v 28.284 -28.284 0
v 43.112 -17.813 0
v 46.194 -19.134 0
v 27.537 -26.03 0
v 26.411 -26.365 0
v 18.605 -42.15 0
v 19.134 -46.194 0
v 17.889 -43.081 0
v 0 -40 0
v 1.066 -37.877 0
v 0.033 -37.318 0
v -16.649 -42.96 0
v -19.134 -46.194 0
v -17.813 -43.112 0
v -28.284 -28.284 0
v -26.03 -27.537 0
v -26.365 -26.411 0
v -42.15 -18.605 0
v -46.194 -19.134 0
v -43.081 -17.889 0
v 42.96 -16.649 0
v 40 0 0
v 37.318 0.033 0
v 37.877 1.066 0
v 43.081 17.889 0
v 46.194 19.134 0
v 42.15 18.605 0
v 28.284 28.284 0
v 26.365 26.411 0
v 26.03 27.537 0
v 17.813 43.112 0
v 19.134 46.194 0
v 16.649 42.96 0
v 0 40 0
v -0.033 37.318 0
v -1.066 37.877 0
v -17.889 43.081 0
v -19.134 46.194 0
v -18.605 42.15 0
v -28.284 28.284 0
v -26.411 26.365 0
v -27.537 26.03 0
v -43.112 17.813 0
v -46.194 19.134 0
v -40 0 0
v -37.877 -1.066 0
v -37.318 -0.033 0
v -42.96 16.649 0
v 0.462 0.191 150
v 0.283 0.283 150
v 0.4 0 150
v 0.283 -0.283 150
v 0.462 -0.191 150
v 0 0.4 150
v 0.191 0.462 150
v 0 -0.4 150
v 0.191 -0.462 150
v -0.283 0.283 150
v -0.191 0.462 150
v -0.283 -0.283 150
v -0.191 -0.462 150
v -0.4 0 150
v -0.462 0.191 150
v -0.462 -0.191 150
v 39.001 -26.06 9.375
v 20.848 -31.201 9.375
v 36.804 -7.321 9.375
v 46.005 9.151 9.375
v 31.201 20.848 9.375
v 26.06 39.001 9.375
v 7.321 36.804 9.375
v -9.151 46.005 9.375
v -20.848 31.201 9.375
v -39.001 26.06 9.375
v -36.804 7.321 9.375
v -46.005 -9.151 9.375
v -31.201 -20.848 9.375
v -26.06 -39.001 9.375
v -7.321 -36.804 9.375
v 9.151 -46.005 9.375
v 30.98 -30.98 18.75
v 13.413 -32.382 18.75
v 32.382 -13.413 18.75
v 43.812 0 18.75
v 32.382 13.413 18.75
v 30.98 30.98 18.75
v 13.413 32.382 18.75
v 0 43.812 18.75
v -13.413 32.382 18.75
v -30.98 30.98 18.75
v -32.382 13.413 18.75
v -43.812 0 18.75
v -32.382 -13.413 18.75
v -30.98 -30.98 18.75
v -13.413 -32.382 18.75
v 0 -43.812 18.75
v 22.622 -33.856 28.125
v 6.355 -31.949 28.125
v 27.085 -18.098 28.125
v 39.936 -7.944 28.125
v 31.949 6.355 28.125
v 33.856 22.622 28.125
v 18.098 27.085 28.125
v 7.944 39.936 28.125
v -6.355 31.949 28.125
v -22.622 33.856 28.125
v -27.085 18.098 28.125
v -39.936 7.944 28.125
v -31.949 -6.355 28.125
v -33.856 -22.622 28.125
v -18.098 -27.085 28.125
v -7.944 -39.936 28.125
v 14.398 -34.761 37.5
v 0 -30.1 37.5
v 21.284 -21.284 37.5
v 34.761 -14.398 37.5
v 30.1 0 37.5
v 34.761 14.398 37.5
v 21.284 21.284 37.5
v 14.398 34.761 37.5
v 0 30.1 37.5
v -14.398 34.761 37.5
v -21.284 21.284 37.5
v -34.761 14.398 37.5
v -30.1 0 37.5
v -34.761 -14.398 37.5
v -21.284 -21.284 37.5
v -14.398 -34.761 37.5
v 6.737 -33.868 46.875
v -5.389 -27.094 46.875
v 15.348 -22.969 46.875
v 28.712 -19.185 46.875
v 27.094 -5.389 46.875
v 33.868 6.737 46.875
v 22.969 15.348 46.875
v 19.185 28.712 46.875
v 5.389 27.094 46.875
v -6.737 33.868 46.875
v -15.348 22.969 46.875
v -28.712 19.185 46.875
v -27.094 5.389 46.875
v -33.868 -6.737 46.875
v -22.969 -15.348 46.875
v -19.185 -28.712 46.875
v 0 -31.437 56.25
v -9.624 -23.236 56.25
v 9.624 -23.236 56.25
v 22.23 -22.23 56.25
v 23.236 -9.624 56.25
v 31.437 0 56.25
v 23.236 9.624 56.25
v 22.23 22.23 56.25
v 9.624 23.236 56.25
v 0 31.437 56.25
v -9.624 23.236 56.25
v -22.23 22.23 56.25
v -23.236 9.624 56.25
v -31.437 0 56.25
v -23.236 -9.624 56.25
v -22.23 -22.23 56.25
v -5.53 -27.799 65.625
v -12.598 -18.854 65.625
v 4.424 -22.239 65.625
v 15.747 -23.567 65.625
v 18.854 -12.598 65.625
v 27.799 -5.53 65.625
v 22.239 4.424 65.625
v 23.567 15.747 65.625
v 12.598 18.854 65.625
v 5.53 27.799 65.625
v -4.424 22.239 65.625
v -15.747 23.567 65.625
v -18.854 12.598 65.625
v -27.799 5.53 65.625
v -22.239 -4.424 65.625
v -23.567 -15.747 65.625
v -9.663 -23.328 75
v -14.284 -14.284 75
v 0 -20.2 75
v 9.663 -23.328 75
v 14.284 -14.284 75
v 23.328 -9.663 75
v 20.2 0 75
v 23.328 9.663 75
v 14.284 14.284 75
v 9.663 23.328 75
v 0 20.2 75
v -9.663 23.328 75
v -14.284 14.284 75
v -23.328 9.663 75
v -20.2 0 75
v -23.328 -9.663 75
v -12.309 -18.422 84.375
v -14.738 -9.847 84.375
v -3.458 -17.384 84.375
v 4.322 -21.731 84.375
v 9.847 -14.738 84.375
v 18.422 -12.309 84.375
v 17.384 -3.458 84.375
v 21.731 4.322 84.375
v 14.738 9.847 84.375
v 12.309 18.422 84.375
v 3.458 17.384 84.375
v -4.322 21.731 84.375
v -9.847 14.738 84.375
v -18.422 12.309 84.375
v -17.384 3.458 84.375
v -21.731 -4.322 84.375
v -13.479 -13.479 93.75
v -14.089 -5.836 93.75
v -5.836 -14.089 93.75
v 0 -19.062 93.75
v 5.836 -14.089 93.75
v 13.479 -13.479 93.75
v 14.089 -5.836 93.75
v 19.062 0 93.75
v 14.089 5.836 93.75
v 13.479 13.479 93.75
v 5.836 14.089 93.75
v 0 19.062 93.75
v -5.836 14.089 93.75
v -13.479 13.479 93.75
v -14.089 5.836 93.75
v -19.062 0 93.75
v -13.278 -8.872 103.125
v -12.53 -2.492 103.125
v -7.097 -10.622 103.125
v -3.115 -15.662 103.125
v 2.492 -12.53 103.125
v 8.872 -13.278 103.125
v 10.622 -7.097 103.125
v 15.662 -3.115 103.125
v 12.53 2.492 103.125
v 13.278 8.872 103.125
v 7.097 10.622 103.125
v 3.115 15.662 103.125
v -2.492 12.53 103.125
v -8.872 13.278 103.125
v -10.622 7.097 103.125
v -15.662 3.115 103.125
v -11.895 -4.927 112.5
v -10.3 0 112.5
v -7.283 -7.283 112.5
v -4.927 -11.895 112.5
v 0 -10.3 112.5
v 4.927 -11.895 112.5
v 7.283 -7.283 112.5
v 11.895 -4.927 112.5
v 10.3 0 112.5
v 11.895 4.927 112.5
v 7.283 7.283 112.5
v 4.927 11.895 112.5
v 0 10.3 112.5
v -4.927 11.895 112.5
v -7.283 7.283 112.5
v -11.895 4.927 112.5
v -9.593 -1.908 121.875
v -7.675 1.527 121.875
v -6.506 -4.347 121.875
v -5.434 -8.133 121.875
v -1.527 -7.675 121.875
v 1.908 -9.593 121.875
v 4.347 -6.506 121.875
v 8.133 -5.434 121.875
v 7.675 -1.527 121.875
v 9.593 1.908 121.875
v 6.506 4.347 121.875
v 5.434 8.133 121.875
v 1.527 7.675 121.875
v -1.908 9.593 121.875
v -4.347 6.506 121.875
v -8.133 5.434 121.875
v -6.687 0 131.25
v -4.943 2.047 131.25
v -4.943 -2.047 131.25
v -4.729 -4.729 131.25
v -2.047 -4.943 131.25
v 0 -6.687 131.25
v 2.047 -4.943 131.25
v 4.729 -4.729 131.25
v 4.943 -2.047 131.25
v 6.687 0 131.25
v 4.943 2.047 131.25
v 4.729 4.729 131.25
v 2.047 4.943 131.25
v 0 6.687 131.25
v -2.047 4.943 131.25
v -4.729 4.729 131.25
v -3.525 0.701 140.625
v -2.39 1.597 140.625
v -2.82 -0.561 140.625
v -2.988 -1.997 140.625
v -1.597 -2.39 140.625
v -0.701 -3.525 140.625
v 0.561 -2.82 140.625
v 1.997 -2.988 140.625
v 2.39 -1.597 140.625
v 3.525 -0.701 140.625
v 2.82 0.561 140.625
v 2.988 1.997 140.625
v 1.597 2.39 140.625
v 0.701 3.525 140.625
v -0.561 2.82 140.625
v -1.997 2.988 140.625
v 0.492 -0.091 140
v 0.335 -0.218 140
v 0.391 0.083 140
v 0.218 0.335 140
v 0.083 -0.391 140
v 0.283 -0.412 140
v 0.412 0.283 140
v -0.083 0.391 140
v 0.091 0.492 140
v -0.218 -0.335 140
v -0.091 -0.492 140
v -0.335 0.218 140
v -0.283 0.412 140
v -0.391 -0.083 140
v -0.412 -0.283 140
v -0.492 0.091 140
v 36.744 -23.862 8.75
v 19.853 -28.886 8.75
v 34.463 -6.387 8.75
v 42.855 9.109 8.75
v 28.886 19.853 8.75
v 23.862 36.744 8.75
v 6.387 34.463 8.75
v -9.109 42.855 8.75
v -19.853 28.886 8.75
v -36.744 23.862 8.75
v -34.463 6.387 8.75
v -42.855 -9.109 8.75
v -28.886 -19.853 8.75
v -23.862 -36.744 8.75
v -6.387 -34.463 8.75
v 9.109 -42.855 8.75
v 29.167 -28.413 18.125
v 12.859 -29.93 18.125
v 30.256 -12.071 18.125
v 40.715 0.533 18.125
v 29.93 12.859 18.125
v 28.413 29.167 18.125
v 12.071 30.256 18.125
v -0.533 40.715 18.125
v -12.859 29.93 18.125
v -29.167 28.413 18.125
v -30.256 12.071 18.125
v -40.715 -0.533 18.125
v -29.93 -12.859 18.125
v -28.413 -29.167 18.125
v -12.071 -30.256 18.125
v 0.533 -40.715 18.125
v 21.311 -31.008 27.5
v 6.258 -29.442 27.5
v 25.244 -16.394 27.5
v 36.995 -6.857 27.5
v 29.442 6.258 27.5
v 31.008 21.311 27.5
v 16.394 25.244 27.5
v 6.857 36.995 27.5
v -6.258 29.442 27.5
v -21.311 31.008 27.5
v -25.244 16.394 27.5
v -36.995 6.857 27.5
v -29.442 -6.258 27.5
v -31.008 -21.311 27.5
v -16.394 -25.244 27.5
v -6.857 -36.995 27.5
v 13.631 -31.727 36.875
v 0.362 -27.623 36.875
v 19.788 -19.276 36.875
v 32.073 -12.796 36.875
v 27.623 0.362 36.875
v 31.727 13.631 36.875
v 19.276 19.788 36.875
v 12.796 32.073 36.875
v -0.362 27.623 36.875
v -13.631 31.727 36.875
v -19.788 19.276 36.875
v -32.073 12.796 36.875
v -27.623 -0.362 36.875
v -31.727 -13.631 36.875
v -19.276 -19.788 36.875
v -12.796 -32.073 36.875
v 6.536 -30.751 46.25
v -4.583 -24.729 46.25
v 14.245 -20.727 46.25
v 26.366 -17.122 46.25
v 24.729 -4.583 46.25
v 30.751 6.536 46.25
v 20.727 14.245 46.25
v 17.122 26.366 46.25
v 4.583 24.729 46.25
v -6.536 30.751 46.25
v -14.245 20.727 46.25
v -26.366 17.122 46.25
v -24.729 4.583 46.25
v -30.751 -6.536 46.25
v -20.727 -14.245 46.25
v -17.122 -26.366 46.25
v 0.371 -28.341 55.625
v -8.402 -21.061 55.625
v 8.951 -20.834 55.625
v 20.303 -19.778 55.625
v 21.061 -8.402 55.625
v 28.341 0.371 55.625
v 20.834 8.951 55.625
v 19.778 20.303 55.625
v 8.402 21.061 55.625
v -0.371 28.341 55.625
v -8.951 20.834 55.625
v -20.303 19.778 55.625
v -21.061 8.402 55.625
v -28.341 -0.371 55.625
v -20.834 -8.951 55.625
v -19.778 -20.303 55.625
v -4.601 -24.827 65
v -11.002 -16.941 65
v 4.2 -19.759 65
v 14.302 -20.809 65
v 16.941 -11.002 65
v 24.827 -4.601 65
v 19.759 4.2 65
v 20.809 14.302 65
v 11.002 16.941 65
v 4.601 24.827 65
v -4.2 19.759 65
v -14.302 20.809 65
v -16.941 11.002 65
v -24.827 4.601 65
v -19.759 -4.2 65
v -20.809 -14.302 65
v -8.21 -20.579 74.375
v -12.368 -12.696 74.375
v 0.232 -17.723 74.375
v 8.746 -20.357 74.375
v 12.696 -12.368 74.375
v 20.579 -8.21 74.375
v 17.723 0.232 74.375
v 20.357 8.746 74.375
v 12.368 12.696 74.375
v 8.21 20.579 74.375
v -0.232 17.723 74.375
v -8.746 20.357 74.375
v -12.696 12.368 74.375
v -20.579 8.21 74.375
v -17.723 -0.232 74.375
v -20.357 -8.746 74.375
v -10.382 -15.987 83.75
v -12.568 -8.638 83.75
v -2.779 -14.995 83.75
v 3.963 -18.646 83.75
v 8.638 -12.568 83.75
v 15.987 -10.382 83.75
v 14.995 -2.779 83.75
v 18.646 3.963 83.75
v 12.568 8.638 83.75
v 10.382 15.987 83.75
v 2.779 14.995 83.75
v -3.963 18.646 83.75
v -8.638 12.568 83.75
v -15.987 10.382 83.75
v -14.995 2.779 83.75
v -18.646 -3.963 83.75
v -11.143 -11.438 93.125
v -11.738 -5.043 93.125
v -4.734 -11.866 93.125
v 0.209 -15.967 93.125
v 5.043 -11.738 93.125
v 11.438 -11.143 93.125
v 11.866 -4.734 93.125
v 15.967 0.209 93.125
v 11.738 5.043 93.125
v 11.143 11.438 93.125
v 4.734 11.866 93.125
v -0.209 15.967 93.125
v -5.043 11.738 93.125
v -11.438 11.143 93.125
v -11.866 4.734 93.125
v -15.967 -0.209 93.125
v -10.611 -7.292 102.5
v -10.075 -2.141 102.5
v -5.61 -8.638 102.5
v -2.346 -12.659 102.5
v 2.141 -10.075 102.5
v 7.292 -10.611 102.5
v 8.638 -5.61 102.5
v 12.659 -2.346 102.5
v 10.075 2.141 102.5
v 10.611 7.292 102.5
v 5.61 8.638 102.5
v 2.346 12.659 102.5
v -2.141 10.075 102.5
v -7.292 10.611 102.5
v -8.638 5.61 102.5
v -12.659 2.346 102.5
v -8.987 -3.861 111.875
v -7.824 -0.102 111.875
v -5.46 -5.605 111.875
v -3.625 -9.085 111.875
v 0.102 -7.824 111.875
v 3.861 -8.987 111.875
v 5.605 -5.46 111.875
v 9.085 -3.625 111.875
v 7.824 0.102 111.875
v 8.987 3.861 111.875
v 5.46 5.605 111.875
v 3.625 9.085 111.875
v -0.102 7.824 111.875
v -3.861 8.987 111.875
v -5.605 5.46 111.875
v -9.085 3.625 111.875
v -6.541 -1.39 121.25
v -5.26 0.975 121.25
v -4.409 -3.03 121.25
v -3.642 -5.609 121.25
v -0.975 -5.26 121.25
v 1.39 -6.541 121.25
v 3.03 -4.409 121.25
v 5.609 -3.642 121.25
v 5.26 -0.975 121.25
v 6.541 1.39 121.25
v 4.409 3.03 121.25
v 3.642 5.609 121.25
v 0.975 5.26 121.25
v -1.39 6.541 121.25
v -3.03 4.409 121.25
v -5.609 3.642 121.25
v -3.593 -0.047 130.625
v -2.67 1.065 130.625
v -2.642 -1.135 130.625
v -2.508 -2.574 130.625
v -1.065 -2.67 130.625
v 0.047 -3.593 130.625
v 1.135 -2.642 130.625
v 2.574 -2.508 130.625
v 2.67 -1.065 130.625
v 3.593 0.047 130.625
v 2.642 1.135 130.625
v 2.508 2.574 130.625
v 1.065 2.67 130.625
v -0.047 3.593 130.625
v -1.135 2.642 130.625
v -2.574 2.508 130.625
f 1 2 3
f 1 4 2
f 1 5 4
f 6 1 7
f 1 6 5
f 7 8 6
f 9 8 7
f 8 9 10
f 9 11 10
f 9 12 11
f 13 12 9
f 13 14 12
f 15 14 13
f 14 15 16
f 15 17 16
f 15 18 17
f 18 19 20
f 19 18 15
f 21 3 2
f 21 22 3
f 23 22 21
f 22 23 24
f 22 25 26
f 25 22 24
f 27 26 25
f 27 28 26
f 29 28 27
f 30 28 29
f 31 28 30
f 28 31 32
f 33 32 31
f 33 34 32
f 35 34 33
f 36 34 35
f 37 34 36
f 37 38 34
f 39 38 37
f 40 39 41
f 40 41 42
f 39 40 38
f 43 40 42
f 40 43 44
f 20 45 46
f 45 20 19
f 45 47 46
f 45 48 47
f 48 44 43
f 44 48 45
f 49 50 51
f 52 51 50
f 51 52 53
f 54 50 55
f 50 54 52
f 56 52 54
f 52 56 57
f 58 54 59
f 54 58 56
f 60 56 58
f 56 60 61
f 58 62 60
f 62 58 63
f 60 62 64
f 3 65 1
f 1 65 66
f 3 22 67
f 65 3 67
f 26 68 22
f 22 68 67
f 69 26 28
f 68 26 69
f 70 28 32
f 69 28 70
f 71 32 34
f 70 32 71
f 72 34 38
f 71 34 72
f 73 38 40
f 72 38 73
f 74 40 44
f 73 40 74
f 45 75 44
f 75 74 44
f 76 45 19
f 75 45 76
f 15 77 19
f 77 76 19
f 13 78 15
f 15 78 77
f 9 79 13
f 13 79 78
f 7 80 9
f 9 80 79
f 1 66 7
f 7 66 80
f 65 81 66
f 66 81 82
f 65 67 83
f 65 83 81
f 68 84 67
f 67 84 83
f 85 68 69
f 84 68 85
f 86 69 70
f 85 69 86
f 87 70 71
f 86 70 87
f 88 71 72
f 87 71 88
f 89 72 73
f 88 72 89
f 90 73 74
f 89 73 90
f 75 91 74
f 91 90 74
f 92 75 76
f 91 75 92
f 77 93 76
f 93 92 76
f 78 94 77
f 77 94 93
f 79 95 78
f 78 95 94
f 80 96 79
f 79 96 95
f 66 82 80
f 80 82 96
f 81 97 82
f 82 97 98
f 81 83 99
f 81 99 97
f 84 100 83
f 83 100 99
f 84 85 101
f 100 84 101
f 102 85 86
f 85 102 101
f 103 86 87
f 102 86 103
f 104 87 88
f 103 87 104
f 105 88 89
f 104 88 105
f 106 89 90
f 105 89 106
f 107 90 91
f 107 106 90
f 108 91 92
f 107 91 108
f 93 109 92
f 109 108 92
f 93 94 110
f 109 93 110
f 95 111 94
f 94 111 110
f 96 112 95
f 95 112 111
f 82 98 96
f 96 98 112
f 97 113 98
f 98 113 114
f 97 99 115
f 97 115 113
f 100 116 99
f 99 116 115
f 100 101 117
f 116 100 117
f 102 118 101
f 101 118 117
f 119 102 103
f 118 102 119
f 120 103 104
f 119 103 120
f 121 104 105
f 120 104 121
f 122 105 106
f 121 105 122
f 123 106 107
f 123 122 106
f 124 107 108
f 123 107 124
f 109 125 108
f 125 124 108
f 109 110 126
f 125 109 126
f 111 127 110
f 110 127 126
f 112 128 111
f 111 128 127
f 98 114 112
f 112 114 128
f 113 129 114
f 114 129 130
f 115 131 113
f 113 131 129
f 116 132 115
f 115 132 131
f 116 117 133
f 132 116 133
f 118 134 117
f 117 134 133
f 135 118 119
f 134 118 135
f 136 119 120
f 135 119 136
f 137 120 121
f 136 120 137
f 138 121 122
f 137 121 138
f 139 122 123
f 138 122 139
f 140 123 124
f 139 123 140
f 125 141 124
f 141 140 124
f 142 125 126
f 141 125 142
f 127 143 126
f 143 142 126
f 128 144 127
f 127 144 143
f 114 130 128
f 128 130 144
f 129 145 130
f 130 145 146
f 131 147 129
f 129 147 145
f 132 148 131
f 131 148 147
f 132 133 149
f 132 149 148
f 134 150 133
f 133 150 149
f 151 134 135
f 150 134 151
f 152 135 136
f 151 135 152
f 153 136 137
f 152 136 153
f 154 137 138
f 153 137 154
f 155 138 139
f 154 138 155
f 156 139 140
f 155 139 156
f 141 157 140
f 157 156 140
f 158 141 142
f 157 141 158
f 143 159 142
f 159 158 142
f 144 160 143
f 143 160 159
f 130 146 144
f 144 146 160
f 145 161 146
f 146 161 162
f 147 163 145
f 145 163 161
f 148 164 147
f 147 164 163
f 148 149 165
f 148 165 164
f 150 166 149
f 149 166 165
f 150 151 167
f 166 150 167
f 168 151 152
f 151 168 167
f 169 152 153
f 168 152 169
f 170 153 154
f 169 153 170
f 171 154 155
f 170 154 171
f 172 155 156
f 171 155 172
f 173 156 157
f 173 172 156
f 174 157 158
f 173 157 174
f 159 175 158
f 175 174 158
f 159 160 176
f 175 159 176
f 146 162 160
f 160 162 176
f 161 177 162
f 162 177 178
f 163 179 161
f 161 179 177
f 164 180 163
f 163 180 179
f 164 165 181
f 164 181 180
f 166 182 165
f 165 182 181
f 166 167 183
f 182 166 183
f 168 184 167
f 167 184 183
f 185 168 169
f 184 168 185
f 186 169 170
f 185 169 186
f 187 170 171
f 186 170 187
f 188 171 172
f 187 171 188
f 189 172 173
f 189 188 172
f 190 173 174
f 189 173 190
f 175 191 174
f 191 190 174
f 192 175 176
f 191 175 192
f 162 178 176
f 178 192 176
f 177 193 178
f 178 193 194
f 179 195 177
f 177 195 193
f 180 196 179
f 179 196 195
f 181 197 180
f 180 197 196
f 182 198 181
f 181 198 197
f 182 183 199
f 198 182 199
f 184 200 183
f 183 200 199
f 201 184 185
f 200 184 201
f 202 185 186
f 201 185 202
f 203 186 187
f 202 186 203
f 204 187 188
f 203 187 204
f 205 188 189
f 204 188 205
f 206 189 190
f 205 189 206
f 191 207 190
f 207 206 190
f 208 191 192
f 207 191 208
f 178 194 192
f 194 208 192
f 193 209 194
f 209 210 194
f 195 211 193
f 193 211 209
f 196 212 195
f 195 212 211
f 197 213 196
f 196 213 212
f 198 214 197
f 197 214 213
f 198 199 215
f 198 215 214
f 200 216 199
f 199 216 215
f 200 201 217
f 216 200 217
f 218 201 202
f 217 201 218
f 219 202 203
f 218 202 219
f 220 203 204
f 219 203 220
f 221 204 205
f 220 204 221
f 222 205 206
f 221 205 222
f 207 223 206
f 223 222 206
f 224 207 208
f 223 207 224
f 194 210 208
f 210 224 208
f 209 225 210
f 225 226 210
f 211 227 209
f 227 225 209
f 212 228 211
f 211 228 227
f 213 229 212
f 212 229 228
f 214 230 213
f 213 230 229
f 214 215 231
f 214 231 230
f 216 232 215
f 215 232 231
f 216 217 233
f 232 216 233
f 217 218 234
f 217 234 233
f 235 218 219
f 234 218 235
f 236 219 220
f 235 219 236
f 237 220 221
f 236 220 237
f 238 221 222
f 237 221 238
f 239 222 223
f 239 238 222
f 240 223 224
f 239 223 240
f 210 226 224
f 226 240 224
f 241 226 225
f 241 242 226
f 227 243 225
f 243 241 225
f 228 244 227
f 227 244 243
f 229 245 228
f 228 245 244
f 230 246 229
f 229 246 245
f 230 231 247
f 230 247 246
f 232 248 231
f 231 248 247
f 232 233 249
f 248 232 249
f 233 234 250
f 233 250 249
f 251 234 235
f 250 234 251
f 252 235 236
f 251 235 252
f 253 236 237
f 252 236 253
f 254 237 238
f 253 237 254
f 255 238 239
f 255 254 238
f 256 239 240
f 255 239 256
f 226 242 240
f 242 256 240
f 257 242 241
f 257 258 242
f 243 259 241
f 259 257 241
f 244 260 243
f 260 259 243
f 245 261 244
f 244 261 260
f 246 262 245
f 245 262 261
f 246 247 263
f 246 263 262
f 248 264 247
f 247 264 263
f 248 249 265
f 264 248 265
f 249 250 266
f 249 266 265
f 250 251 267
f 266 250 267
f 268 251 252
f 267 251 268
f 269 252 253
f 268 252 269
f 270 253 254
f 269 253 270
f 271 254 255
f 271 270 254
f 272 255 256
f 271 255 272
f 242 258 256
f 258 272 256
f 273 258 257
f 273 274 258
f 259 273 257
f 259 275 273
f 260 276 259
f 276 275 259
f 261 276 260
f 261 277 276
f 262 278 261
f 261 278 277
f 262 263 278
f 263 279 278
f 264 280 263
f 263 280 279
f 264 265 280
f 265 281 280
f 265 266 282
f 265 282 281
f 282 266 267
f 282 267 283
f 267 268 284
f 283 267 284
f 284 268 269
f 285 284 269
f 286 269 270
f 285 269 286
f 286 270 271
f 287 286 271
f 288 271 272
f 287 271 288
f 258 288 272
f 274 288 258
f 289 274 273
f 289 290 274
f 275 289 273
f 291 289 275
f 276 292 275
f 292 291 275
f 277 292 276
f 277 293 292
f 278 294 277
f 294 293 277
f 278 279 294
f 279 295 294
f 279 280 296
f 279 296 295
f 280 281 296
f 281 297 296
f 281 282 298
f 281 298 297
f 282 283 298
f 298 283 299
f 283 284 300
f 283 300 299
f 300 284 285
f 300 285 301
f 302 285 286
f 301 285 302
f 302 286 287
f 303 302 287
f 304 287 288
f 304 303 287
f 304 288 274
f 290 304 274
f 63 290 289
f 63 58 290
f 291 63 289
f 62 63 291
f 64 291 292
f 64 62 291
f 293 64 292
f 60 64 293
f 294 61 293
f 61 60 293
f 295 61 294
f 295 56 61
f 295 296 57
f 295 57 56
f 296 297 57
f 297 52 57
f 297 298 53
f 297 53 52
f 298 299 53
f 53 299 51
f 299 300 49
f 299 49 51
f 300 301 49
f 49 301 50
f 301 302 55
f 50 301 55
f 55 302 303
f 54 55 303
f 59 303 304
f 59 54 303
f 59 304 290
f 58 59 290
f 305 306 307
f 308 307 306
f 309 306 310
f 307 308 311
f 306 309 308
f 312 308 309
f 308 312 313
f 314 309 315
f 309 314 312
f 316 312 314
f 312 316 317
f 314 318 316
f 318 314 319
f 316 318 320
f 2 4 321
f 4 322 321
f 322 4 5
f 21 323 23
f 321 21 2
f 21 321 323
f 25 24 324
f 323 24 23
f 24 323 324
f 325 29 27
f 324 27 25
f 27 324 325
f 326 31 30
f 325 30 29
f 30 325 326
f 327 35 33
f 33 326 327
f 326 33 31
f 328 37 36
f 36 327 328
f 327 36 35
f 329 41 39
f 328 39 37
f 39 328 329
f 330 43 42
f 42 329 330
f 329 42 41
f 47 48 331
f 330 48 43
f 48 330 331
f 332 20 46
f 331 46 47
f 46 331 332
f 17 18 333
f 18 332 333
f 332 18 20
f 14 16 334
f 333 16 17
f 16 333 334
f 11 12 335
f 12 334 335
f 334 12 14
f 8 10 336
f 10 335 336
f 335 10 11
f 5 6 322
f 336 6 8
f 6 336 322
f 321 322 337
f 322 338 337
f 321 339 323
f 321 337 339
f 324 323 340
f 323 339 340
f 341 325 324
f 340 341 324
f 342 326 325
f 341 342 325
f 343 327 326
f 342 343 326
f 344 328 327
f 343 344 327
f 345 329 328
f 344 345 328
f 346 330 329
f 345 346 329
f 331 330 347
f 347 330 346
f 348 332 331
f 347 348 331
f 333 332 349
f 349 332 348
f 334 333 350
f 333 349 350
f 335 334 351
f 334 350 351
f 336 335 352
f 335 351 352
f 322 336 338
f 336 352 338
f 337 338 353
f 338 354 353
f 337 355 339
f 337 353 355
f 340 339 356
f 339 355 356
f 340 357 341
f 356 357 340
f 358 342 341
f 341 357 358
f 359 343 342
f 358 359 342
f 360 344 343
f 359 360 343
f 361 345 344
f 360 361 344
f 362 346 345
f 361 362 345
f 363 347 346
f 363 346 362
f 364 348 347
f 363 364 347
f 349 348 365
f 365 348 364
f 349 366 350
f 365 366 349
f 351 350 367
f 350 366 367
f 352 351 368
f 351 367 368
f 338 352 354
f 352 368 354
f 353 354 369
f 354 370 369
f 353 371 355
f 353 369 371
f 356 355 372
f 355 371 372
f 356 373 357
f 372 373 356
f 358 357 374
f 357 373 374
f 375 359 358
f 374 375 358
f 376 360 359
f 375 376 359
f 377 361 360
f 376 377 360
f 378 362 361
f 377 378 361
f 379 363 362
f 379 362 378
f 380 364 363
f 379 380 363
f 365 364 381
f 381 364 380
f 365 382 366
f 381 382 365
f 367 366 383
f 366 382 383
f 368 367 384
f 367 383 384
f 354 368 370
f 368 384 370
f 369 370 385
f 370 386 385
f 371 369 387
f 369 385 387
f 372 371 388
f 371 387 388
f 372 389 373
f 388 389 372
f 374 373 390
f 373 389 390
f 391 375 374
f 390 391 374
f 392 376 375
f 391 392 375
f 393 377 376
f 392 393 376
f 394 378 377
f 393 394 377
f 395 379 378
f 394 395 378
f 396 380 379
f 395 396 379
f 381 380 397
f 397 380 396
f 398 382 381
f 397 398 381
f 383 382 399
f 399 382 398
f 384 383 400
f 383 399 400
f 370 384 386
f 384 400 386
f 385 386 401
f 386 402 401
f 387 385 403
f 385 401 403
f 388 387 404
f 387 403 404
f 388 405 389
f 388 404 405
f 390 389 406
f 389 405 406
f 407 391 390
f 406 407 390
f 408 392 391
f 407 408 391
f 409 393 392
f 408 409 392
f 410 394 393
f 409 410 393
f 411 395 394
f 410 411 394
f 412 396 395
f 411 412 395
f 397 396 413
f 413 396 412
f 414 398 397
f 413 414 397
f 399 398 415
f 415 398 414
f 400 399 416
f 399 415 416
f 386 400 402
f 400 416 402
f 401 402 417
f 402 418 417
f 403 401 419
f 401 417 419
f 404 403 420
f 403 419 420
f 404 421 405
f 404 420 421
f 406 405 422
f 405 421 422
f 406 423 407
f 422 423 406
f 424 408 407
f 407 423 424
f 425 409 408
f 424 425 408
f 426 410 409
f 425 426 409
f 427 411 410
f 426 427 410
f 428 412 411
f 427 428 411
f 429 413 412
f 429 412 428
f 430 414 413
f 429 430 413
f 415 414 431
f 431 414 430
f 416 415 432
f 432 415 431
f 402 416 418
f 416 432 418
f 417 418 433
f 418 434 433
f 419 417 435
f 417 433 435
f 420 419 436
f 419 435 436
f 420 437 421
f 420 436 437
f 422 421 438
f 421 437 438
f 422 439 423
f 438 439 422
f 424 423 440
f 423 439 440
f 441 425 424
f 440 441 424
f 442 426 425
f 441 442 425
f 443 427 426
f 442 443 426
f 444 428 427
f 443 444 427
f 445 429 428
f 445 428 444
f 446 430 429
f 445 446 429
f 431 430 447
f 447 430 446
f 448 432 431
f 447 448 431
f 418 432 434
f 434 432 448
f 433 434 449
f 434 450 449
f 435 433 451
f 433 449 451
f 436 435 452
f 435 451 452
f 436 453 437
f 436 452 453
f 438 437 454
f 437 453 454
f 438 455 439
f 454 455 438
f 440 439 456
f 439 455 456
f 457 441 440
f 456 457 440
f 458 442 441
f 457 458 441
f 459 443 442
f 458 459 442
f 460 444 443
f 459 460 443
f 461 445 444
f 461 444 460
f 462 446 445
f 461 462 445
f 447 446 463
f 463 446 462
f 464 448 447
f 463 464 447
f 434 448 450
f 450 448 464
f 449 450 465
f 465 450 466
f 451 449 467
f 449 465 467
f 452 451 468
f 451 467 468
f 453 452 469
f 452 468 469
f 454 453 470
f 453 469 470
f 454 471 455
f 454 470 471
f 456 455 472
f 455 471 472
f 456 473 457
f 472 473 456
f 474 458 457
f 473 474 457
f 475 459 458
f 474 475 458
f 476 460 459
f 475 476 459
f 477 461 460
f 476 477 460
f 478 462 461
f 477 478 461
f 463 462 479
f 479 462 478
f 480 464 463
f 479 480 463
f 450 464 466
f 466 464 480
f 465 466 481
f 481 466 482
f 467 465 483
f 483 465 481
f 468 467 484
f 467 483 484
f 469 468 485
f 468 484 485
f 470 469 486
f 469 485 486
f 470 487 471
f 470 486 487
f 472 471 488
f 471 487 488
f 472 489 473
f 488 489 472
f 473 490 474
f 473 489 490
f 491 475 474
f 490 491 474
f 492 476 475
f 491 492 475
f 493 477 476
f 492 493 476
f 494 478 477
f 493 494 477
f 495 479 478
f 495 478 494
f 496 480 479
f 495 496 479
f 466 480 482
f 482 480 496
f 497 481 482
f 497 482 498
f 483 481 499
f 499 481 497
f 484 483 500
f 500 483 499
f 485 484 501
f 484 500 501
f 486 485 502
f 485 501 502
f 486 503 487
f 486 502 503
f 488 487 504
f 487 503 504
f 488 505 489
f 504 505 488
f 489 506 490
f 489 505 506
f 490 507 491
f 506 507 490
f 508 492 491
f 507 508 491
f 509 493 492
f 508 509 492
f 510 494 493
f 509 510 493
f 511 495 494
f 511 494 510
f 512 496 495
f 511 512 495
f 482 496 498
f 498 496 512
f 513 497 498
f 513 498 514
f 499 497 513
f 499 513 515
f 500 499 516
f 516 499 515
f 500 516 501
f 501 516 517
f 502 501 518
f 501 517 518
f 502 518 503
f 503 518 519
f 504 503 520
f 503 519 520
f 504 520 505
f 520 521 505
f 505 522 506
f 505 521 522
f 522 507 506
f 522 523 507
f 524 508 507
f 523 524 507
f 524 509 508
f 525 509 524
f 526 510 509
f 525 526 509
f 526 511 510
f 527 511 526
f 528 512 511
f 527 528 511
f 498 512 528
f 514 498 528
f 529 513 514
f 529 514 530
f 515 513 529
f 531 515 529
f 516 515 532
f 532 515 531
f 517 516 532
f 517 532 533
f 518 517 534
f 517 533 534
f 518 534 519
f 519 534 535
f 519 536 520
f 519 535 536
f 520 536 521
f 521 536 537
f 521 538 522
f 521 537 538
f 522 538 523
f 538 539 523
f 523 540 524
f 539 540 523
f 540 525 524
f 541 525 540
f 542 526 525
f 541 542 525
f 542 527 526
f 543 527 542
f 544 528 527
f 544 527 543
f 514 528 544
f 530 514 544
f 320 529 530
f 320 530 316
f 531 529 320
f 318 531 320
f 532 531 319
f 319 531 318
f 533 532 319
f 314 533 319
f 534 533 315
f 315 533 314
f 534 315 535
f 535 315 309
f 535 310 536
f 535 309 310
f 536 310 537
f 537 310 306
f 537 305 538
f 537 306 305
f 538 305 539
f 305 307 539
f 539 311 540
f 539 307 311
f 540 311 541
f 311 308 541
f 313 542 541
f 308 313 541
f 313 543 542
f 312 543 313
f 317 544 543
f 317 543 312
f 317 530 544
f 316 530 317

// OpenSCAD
// Crystal Star Tree
height=150;
radius=50;
points=8;

function starvec(theta, n, s1, s2, i) = (i < n-1)?concat([[(i%2?s1:s2)*sin(theta*i),(i%2?s1:s2)*cos(theta*i)]], starvec(theta,n,s1,s2,i+1)) : [[(i%2?s1:s2)*sin(theta*i),(i%2?s1:s2)*cos(theta*i)]];

module star(r, n, i = 0.5) {
    p = starvec(360.0/(n*2),n*2,r,i*r,0);
    polygon(points=p, convexity=n);
}

module star_column(rad, h, pts) {
    linear_extrude(height=h,twist=180,scale=.01,$fn=32,convexity=10)
        scale([1,1])
            star(r=rad,n=pts,i=.8);
}

difference() {
    star_column(radius, height, points);
    rotate([0,0,12])
        translate([0,0,-height/15])
            star_column(radius, height, points);
}
